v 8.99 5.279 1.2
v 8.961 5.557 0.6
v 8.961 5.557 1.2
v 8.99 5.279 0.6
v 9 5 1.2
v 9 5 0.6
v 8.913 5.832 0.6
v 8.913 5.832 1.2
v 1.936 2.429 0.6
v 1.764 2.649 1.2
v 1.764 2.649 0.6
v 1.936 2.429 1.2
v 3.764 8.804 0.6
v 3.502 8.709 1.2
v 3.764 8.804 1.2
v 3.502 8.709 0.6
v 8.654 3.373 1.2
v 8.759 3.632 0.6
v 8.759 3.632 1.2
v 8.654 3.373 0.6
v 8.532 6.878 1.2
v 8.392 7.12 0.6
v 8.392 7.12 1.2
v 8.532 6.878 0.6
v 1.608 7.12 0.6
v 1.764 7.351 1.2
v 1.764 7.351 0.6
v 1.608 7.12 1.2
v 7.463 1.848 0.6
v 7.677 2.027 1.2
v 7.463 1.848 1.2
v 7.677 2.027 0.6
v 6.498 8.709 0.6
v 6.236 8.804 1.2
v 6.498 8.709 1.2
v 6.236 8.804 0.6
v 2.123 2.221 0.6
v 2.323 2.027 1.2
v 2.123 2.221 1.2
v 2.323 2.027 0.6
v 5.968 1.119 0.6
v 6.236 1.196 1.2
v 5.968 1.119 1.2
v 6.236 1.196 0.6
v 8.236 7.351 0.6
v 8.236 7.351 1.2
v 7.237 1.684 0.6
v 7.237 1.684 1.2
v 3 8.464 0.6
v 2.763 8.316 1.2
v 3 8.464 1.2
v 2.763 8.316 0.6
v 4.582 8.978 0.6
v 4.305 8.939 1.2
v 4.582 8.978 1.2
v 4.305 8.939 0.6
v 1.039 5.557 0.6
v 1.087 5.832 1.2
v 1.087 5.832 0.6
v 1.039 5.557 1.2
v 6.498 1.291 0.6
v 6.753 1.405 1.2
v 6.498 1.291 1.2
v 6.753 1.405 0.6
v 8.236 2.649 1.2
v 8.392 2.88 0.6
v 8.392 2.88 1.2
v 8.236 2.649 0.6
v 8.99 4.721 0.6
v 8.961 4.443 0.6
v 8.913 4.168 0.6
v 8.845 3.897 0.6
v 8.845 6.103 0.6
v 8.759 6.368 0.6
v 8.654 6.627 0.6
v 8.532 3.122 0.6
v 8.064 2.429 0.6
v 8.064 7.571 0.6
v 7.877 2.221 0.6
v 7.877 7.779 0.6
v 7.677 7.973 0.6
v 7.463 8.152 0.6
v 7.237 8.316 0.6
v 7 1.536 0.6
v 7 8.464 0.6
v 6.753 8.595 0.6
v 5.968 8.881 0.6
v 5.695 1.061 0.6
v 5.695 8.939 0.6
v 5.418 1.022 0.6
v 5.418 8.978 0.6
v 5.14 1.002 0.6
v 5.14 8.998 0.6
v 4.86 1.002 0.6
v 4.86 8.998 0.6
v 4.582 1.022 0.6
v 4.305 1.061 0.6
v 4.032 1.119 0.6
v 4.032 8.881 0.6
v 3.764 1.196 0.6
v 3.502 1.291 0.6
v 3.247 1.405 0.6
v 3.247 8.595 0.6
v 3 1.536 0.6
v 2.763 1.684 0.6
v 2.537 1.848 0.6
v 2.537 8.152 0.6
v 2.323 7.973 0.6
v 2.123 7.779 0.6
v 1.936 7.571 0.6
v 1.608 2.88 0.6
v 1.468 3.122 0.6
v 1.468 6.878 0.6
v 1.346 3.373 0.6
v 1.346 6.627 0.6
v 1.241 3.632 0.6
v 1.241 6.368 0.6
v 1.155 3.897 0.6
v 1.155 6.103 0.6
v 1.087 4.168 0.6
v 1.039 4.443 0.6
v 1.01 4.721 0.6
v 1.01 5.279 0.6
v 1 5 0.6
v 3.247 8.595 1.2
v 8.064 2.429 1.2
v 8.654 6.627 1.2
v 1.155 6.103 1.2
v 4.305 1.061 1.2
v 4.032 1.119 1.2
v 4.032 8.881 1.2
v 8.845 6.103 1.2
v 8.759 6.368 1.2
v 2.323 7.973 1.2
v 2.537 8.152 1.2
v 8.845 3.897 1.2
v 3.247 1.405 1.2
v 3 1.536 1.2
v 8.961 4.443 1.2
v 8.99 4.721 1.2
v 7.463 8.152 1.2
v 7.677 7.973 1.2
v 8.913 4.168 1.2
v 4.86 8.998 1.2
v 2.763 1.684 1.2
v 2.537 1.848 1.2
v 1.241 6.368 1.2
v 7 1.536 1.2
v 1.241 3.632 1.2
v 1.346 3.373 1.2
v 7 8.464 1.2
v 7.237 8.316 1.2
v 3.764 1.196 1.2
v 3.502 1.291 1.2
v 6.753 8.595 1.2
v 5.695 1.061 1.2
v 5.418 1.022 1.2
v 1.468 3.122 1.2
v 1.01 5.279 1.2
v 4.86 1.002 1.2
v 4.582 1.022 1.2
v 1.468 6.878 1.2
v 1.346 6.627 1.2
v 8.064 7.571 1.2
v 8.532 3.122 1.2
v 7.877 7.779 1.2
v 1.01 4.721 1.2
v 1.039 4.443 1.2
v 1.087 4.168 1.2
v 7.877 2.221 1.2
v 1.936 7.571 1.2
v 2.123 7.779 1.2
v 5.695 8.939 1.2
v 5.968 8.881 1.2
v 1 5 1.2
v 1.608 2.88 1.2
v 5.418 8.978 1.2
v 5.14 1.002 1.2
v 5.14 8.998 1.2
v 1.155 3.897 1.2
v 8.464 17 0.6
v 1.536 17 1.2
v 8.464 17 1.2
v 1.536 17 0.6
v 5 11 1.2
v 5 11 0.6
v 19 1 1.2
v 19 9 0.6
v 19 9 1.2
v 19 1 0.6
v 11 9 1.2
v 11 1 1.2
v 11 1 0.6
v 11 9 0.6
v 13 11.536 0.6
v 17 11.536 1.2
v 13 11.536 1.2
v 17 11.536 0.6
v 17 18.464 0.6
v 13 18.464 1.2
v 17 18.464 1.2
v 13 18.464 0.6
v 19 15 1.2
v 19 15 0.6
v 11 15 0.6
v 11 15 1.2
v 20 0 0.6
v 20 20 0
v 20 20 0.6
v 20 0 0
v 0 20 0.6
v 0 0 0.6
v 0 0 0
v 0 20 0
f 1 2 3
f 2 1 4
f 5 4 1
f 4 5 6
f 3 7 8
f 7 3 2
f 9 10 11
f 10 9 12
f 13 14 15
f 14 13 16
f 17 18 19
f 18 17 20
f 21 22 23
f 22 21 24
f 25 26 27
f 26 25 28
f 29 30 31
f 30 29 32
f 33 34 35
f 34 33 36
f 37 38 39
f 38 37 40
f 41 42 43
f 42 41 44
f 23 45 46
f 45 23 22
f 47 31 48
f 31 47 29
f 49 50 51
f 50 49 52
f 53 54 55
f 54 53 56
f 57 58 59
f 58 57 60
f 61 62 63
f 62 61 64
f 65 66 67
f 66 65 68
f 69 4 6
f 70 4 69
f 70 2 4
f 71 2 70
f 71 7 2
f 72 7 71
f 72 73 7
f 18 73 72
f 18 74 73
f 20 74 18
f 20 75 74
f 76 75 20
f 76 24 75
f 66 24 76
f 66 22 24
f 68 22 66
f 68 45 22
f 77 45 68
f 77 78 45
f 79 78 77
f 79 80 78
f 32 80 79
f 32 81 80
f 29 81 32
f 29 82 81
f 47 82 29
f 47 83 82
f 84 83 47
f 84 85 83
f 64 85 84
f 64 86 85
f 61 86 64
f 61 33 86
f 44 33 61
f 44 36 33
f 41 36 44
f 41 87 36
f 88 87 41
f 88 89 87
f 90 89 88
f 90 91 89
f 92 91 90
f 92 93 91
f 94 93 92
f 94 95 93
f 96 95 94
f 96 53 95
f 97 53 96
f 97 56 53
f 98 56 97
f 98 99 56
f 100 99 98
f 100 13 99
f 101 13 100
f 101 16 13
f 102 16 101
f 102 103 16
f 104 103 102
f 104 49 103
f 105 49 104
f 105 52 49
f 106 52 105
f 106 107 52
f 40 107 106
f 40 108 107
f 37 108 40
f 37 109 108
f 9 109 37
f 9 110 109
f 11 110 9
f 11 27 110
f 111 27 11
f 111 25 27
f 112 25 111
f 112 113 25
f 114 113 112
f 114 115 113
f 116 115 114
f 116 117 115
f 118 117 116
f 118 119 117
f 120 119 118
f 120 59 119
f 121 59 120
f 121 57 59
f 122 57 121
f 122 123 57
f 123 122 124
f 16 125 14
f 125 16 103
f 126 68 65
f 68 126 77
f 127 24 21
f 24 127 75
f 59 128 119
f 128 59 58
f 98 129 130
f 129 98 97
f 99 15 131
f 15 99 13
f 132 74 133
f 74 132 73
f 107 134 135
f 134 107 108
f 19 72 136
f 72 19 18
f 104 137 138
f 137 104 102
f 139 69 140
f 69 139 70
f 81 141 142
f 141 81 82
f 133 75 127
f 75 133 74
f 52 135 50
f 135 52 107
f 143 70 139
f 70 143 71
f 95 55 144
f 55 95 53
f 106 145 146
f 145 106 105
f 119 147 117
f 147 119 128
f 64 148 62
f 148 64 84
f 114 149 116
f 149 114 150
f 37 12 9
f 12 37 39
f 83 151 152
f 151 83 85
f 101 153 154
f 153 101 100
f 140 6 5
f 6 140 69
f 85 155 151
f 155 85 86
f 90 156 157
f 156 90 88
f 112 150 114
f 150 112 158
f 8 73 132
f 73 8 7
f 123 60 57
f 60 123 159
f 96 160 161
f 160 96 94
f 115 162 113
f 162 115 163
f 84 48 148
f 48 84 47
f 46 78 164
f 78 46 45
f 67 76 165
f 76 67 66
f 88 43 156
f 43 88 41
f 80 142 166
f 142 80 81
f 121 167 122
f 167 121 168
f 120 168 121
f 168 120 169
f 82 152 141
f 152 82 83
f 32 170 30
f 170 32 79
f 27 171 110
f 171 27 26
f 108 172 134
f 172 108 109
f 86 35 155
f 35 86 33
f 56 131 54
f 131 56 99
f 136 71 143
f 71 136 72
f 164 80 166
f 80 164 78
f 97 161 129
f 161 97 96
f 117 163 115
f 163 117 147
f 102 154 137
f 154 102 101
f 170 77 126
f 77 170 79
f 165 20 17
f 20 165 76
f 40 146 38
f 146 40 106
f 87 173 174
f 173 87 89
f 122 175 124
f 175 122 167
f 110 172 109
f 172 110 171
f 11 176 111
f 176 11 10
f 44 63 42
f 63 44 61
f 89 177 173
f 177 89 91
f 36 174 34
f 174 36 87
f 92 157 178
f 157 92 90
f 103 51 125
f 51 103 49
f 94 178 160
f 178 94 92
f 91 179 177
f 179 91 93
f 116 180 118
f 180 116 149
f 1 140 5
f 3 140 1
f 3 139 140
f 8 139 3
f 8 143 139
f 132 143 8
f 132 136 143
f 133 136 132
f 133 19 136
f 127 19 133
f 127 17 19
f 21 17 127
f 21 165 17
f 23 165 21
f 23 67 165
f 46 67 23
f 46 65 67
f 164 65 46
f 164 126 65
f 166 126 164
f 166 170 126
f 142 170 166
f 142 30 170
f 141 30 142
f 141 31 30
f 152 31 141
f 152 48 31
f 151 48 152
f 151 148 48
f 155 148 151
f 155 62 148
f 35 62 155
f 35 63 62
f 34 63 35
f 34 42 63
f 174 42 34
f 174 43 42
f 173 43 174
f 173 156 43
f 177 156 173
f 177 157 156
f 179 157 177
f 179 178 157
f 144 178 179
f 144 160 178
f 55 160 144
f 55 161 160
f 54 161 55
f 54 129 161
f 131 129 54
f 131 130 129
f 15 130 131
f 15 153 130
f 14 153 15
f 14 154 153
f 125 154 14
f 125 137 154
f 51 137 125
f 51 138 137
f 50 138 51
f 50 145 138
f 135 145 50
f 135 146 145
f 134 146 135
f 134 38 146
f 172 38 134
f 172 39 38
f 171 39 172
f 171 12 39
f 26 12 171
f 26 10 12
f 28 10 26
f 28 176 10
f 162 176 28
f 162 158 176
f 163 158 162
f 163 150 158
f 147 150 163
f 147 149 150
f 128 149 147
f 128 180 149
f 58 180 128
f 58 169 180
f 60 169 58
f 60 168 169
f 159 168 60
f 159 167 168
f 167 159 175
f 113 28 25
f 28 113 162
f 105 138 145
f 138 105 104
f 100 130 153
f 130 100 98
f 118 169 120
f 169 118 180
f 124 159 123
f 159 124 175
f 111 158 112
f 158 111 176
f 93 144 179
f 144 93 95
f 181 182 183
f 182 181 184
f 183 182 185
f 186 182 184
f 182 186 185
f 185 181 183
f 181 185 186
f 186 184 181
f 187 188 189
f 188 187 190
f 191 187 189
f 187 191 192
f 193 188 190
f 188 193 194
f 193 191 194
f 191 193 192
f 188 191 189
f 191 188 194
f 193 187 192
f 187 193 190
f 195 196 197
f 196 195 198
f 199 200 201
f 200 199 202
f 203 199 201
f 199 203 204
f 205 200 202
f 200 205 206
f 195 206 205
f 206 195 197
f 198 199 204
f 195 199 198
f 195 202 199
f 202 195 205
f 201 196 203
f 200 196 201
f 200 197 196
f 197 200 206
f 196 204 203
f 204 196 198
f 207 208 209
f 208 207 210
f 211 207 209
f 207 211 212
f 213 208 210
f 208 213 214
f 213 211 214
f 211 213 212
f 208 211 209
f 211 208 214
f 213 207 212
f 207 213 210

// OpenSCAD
color("green") cube([20, 20, 0.6]);

translate([0,0,0.6]) {
    // circle
    translate([5,5,0])
        color("red") 
            cylinder(d=8,h=0.6, $fn=90);
    // triangle
    translate([5,15,0])
        rotate([0,0,30])
            color("red") 
                cylinder(d=8,h=0.6, $fn=3);
    // cube
    translate([15-4,1,0])
        color("red") 
            cube([8, 8, 0.6]);
    // hexagon
    translate([15,15,0])
        color("red") 
            cylinder(d=8,h=0.6, $fn=6);
}
